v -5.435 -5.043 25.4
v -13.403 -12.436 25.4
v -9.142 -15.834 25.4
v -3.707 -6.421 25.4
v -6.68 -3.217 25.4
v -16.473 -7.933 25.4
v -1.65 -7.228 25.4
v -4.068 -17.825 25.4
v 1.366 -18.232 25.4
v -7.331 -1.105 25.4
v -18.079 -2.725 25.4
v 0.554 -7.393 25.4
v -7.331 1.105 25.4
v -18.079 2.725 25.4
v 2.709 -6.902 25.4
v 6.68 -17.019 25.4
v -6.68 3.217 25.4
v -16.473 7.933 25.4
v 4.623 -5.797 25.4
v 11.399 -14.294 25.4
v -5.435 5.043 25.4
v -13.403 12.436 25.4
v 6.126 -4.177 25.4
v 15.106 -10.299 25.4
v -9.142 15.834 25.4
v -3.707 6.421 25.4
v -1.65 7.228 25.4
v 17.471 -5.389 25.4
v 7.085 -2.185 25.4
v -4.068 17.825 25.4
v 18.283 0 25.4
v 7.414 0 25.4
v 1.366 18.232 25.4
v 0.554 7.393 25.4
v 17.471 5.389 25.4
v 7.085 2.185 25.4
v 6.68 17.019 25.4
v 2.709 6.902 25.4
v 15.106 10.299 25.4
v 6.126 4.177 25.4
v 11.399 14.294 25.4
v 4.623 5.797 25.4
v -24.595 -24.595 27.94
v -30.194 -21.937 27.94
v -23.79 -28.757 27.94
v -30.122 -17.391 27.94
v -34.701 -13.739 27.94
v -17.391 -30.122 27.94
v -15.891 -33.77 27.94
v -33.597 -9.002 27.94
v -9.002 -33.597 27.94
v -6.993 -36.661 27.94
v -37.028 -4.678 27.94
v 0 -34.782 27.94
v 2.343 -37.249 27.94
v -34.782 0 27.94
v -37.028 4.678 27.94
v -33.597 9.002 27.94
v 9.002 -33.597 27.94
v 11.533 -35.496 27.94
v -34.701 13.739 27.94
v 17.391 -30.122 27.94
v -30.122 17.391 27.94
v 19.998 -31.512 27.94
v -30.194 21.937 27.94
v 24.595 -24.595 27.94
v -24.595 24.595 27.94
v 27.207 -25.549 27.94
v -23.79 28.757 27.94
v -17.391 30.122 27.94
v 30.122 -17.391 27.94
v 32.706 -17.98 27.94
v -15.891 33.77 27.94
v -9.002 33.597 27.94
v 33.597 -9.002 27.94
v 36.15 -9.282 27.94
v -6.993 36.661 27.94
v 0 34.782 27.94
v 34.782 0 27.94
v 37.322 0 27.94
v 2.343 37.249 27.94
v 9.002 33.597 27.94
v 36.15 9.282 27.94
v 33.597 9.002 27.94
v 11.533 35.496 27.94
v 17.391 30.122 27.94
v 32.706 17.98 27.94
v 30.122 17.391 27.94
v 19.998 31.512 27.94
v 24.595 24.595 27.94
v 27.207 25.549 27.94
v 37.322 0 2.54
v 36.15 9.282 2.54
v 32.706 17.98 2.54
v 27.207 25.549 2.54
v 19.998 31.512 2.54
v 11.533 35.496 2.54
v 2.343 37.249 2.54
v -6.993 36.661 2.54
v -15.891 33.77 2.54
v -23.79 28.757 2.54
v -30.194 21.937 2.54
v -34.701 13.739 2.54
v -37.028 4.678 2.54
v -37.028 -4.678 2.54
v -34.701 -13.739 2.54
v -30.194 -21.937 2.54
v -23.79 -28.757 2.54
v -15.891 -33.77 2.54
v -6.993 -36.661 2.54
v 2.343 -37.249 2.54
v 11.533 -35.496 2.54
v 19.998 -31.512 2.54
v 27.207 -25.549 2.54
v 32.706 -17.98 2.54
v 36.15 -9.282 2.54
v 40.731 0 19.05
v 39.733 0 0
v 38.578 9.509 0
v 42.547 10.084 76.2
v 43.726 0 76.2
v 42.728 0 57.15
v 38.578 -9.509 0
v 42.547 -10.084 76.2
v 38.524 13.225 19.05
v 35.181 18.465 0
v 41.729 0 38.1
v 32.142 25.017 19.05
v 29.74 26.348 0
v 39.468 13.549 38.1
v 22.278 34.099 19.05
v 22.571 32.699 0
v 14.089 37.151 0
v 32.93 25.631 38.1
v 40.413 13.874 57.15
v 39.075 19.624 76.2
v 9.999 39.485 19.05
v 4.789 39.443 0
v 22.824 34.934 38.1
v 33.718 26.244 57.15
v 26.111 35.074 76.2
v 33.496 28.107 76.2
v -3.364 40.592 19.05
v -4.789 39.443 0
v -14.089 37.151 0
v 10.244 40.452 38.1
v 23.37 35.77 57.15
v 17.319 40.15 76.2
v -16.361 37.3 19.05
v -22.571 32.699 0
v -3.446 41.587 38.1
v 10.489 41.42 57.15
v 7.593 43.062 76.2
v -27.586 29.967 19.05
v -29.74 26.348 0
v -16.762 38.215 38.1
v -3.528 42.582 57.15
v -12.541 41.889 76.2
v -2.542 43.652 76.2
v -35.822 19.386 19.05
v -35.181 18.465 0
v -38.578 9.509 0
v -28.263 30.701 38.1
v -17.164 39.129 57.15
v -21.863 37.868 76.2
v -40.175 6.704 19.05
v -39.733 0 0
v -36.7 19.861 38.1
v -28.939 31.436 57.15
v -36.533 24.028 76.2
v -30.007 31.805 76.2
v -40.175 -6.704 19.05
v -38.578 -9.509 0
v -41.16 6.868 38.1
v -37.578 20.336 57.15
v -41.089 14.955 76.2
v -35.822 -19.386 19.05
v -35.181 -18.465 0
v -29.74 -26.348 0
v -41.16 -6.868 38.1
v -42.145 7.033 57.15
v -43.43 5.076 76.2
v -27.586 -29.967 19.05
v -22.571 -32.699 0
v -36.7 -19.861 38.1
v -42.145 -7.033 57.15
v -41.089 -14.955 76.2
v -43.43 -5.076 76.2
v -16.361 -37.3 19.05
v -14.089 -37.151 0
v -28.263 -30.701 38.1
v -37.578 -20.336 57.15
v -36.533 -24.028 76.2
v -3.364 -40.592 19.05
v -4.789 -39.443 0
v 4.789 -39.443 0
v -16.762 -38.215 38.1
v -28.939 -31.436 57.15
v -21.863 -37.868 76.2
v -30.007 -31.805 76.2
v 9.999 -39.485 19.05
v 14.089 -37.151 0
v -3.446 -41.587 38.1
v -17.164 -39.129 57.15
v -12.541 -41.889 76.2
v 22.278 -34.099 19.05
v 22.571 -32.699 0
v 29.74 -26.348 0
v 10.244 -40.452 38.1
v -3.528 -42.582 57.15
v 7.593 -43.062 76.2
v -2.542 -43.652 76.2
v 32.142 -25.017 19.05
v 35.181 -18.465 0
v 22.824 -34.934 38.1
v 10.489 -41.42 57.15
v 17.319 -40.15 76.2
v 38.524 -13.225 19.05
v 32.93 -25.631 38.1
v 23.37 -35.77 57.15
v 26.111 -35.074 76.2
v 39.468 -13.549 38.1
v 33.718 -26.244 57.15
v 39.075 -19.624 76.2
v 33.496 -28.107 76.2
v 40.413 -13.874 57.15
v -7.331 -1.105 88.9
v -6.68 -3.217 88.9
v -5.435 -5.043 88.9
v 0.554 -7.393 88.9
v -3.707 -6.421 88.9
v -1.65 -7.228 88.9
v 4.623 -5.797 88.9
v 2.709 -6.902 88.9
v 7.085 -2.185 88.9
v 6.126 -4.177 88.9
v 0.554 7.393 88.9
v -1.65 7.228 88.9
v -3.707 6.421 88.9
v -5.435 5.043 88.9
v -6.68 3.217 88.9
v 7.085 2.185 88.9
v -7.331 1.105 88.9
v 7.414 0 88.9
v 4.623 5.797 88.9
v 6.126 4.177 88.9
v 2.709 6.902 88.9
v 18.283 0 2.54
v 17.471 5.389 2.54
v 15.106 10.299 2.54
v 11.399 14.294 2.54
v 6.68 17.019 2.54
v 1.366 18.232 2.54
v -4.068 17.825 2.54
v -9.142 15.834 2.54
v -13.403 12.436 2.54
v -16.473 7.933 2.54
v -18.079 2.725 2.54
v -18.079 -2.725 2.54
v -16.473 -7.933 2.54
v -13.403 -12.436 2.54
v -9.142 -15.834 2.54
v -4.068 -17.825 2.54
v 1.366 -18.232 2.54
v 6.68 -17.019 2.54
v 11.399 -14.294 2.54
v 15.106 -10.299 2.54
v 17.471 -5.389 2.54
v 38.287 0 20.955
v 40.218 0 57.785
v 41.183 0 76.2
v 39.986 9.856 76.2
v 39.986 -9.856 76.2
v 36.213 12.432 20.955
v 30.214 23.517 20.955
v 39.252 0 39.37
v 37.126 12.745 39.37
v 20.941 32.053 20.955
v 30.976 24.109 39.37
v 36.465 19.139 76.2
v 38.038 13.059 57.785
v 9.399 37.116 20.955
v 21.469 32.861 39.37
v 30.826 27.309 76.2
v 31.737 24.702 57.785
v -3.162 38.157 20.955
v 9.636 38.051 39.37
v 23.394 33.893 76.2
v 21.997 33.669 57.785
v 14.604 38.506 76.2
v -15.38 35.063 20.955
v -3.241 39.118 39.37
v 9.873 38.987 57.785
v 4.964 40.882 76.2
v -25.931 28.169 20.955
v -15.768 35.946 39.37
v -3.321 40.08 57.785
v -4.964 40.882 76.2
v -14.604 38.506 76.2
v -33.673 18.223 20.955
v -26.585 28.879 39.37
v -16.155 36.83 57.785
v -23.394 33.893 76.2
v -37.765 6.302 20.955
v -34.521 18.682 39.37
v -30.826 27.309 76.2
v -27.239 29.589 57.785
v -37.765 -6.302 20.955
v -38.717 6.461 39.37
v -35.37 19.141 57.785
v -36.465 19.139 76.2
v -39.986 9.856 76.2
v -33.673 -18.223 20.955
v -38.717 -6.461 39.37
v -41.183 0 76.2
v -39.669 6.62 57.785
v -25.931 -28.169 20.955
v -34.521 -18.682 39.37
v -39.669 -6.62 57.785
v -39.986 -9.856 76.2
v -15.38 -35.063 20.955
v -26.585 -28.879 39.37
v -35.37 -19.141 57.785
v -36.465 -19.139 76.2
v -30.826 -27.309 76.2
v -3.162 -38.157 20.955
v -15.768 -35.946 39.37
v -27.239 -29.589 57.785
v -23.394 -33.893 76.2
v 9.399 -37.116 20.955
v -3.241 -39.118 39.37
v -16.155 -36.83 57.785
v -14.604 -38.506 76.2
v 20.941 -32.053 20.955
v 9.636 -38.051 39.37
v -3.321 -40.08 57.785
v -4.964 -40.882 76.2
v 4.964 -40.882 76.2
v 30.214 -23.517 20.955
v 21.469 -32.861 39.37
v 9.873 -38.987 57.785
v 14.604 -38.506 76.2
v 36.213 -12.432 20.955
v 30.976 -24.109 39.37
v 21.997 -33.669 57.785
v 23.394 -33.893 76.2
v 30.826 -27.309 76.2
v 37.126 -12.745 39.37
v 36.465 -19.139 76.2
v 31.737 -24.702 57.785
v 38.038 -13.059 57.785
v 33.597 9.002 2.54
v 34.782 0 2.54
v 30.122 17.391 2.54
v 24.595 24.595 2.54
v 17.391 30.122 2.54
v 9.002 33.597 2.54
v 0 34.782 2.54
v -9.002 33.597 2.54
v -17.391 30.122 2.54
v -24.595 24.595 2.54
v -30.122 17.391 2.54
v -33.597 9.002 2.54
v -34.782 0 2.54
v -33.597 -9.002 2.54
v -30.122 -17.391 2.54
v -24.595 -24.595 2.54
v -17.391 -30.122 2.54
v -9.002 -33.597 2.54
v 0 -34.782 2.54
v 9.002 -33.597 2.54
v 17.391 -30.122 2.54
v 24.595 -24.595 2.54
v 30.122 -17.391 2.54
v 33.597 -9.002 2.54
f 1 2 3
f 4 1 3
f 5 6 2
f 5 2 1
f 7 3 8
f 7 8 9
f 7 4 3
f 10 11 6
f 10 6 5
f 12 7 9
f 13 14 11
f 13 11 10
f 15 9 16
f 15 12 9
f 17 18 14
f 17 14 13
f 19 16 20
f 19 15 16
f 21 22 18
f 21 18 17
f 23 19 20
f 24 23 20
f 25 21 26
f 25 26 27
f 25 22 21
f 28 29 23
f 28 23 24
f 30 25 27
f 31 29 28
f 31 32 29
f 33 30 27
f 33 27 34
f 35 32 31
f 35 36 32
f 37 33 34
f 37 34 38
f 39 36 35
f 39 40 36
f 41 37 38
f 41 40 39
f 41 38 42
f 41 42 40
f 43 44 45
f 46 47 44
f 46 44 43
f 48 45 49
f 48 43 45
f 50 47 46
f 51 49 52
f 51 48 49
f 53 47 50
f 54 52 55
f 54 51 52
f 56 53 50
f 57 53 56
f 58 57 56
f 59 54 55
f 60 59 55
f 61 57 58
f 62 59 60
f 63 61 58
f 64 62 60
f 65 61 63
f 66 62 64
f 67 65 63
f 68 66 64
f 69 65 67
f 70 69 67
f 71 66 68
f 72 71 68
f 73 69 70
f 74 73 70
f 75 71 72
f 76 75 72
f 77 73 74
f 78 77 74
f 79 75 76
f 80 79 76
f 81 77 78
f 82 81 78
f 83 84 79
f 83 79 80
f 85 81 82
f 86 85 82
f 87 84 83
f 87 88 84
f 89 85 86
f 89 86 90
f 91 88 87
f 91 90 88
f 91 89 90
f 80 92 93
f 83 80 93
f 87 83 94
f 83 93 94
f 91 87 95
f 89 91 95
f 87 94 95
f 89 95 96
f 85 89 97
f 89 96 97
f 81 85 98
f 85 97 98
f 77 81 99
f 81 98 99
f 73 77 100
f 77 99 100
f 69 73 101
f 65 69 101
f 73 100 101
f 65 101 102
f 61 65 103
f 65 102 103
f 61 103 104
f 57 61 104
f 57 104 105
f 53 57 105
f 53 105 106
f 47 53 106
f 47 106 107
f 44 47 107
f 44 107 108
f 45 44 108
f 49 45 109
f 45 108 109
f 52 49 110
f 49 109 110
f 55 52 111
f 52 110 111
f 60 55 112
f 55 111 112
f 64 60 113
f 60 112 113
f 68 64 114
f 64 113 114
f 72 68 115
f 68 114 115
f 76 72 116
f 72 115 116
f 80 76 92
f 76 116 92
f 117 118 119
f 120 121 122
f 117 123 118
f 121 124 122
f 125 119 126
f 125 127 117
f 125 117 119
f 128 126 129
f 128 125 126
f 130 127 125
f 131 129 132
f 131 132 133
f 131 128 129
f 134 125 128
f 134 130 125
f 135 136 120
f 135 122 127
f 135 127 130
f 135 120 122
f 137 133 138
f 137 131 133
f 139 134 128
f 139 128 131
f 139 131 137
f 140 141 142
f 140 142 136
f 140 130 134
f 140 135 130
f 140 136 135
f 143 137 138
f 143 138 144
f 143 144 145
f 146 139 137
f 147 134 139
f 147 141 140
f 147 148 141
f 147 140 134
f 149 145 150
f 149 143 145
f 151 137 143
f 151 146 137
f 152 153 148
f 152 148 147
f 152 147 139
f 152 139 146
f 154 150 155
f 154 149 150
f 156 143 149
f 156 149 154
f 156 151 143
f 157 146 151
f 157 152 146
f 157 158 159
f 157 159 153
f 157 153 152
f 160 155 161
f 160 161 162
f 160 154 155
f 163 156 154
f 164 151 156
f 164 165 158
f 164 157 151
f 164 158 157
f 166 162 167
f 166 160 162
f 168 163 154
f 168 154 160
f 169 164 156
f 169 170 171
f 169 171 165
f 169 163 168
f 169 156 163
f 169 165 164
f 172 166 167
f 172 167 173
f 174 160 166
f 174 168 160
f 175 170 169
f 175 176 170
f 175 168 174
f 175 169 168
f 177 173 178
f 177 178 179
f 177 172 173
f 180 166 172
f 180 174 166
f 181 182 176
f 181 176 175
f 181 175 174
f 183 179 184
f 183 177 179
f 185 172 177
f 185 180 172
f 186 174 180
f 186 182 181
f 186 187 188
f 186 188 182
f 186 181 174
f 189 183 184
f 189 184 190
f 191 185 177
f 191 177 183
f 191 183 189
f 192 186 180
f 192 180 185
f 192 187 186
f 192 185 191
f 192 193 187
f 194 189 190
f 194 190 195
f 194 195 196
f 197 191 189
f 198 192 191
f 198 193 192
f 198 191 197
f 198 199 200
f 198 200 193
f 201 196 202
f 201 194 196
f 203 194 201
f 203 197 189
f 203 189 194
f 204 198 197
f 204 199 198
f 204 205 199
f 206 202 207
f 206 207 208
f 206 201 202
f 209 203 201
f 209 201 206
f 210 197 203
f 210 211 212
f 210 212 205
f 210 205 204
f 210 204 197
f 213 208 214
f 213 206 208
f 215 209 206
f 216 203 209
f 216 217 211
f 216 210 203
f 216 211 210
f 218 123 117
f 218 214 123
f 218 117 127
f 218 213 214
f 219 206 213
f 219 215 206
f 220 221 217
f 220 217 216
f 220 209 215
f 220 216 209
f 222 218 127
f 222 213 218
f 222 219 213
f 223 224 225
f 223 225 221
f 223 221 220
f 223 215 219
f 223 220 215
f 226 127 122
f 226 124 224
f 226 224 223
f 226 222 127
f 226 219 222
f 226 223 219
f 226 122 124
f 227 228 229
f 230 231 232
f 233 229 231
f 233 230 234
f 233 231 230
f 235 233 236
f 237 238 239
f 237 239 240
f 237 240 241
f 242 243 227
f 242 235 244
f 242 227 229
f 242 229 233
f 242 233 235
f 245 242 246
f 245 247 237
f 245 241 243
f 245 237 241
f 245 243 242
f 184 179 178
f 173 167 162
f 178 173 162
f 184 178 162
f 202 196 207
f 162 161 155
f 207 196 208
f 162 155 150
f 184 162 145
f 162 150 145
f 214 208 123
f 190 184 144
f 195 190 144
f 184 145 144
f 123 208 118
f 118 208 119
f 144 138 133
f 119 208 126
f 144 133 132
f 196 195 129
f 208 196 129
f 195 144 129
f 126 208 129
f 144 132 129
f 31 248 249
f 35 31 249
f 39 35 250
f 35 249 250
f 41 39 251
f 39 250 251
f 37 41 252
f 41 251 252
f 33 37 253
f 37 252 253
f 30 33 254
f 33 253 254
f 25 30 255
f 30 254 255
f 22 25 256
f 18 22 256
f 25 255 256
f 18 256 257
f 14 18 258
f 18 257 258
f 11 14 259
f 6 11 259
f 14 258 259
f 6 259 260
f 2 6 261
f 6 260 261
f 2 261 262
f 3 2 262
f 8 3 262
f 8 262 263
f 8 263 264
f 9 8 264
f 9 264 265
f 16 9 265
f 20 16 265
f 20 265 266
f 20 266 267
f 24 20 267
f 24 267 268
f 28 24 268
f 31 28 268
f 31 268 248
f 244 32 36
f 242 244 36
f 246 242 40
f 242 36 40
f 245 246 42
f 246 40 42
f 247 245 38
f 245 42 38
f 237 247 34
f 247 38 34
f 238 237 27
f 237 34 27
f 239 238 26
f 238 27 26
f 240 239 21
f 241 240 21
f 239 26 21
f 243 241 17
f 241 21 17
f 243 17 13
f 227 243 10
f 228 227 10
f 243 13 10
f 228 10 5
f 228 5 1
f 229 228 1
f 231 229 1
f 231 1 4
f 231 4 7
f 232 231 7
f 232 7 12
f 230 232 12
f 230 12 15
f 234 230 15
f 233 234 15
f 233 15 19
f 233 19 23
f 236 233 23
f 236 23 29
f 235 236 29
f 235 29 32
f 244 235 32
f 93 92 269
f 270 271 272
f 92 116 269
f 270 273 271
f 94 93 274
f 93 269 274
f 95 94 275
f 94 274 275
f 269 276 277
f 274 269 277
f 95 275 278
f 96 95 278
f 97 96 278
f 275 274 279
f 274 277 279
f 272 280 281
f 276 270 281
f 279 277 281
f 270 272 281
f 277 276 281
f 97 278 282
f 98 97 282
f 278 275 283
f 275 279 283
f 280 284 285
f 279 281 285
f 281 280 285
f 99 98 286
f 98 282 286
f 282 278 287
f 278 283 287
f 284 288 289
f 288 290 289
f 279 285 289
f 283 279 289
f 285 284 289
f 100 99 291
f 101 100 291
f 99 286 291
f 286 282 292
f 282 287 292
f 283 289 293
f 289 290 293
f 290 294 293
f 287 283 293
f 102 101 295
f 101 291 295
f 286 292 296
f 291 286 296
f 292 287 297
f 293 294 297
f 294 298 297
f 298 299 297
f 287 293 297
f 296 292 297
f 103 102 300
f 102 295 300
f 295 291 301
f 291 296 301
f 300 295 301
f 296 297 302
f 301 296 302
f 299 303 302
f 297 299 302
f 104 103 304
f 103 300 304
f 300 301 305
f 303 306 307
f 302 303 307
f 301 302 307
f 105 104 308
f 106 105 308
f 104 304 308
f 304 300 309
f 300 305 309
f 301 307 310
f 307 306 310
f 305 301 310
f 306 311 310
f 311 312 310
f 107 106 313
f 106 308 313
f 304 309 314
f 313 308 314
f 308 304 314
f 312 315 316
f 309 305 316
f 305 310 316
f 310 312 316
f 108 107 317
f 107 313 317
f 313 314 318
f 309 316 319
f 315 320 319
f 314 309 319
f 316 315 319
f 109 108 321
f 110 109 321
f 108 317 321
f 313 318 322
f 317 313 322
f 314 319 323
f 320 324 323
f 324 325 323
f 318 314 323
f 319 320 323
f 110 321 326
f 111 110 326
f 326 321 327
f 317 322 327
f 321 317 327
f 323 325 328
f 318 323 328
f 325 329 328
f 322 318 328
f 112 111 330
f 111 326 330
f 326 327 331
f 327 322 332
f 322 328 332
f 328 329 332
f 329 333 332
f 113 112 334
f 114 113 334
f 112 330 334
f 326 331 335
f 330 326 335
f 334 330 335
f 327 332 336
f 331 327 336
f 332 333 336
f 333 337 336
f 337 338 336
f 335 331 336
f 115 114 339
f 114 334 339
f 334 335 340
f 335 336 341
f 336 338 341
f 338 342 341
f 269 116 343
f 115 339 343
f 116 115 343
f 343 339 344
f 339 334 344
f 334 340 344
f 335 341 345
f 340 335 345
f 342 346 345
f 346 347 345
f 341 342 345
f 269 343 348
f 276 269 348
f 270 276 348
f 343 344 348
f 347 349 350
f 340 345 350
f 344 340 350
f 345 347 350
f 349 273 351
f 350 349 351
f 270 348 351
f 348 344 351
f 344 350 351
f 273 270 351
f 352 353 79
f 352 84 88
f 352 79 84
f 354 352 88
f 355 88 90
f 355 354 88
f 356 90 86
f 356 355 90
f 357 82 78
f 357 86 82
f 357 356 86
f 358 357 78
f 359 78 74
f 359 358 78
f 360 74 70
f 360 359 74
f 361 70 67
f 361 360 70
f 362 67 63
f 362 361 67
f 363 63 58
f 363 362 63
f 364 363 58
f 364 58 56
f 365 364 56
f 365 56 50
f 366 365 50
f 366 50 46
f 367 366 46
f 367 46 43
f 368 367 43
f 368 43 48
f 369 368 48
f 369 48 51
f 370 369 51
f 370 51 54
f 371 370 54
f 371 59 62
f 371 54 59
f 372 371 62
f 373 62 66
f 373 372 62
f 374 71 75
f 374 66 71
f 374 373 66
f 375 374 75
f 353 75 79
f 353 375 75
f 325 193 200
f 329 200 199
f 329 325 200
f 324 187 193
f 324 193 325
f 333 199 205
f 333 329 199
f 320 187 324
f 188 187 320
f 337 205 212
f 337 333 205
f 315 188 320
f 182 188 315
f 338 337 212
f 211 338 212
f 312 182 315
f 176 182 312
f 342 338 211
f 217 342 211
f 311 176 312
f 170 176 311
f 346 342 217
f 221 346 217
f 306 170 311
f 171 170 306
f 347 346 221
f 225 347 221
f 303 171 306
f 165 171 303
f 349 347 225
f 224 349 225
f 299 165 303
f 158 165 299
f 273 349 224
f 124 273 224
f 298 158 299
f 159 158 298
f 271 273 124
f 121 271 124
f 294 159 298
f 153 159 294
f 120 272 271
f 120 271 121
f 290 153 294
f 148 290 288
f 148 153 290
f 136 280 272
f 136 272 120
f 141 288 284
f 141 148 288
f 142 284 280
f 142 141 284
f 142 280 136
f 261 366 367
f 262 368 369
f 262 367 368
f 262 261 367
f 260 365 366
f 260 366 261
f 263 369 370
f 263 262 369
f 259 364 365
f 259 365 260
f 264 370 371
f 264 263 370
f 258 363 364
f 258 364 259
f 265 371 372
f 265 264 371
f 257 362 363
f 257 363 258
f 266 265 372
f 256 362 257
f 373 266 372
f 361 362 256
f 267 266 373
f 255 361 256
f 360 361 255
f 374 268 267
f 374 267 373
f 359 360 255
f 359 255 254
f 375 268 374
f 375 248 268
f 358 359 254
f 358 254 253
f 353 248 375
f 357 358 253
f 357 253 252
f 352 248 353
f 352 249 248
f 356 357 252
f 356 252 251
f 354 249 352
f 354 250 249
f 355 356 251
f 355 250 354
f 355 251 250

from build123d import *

# Parameters (mm, degrees)
F0_R     = 39.7326130333
F1_DEPTH = 76.2
F1_TAPER = -3
F2_T     = -2.54
F3_DEPTH = 25.4
F4_T     = -2.54
F5_R     = 18.2833455915
F6_DEPTH = 25.4
F7_R     = 7.4141197659
F8_DEPTH = 88.9


with BuildPart() as f1:
    # F0 (on Top) → F1 (new body)
    with BuildSketch(Plane.XY):
        Circle(F0_R)
    extrude(amount=F1_DEPTH, taper=F1_TAPER)

    # F2
    f2_openings = [f1.faces().sort_by_distance(p)[0] for p in [
        (0, 0, 76.2),
    ]]
    offset(amount=F2_T, openings=f2_openings, kind=Kind.INTERSECTION)

    # F3 (add): a face of the model
    f3_faces = [f1.faces().sort_by_distance(p)[0] for p in [
        (0, 0, 2.54),
    ]]
    extrude(f3_faces, amount=F3_DEPTH)

    # F4
    f4_openings = [f1.faces().sort_by_distance(p)[0] for p in [
        (0, 0, 27.94),
    ]]
    offset(amount=F4_T, openings=f4_openings, kind=Kind.INTERSECTION)

    # F5 (on Top) → F6 (join)
    with BuildSketch(Plane.XY):
        Circle(F5_R)
    extrude(amount=F6_DEPTH)

    # F7 (on Top) → F8 (join)
    with BuildSketch(Plane.XY):
        Circle(F7_R)
    extrude(amount=F8_DEPTH)


solid = f1.part
